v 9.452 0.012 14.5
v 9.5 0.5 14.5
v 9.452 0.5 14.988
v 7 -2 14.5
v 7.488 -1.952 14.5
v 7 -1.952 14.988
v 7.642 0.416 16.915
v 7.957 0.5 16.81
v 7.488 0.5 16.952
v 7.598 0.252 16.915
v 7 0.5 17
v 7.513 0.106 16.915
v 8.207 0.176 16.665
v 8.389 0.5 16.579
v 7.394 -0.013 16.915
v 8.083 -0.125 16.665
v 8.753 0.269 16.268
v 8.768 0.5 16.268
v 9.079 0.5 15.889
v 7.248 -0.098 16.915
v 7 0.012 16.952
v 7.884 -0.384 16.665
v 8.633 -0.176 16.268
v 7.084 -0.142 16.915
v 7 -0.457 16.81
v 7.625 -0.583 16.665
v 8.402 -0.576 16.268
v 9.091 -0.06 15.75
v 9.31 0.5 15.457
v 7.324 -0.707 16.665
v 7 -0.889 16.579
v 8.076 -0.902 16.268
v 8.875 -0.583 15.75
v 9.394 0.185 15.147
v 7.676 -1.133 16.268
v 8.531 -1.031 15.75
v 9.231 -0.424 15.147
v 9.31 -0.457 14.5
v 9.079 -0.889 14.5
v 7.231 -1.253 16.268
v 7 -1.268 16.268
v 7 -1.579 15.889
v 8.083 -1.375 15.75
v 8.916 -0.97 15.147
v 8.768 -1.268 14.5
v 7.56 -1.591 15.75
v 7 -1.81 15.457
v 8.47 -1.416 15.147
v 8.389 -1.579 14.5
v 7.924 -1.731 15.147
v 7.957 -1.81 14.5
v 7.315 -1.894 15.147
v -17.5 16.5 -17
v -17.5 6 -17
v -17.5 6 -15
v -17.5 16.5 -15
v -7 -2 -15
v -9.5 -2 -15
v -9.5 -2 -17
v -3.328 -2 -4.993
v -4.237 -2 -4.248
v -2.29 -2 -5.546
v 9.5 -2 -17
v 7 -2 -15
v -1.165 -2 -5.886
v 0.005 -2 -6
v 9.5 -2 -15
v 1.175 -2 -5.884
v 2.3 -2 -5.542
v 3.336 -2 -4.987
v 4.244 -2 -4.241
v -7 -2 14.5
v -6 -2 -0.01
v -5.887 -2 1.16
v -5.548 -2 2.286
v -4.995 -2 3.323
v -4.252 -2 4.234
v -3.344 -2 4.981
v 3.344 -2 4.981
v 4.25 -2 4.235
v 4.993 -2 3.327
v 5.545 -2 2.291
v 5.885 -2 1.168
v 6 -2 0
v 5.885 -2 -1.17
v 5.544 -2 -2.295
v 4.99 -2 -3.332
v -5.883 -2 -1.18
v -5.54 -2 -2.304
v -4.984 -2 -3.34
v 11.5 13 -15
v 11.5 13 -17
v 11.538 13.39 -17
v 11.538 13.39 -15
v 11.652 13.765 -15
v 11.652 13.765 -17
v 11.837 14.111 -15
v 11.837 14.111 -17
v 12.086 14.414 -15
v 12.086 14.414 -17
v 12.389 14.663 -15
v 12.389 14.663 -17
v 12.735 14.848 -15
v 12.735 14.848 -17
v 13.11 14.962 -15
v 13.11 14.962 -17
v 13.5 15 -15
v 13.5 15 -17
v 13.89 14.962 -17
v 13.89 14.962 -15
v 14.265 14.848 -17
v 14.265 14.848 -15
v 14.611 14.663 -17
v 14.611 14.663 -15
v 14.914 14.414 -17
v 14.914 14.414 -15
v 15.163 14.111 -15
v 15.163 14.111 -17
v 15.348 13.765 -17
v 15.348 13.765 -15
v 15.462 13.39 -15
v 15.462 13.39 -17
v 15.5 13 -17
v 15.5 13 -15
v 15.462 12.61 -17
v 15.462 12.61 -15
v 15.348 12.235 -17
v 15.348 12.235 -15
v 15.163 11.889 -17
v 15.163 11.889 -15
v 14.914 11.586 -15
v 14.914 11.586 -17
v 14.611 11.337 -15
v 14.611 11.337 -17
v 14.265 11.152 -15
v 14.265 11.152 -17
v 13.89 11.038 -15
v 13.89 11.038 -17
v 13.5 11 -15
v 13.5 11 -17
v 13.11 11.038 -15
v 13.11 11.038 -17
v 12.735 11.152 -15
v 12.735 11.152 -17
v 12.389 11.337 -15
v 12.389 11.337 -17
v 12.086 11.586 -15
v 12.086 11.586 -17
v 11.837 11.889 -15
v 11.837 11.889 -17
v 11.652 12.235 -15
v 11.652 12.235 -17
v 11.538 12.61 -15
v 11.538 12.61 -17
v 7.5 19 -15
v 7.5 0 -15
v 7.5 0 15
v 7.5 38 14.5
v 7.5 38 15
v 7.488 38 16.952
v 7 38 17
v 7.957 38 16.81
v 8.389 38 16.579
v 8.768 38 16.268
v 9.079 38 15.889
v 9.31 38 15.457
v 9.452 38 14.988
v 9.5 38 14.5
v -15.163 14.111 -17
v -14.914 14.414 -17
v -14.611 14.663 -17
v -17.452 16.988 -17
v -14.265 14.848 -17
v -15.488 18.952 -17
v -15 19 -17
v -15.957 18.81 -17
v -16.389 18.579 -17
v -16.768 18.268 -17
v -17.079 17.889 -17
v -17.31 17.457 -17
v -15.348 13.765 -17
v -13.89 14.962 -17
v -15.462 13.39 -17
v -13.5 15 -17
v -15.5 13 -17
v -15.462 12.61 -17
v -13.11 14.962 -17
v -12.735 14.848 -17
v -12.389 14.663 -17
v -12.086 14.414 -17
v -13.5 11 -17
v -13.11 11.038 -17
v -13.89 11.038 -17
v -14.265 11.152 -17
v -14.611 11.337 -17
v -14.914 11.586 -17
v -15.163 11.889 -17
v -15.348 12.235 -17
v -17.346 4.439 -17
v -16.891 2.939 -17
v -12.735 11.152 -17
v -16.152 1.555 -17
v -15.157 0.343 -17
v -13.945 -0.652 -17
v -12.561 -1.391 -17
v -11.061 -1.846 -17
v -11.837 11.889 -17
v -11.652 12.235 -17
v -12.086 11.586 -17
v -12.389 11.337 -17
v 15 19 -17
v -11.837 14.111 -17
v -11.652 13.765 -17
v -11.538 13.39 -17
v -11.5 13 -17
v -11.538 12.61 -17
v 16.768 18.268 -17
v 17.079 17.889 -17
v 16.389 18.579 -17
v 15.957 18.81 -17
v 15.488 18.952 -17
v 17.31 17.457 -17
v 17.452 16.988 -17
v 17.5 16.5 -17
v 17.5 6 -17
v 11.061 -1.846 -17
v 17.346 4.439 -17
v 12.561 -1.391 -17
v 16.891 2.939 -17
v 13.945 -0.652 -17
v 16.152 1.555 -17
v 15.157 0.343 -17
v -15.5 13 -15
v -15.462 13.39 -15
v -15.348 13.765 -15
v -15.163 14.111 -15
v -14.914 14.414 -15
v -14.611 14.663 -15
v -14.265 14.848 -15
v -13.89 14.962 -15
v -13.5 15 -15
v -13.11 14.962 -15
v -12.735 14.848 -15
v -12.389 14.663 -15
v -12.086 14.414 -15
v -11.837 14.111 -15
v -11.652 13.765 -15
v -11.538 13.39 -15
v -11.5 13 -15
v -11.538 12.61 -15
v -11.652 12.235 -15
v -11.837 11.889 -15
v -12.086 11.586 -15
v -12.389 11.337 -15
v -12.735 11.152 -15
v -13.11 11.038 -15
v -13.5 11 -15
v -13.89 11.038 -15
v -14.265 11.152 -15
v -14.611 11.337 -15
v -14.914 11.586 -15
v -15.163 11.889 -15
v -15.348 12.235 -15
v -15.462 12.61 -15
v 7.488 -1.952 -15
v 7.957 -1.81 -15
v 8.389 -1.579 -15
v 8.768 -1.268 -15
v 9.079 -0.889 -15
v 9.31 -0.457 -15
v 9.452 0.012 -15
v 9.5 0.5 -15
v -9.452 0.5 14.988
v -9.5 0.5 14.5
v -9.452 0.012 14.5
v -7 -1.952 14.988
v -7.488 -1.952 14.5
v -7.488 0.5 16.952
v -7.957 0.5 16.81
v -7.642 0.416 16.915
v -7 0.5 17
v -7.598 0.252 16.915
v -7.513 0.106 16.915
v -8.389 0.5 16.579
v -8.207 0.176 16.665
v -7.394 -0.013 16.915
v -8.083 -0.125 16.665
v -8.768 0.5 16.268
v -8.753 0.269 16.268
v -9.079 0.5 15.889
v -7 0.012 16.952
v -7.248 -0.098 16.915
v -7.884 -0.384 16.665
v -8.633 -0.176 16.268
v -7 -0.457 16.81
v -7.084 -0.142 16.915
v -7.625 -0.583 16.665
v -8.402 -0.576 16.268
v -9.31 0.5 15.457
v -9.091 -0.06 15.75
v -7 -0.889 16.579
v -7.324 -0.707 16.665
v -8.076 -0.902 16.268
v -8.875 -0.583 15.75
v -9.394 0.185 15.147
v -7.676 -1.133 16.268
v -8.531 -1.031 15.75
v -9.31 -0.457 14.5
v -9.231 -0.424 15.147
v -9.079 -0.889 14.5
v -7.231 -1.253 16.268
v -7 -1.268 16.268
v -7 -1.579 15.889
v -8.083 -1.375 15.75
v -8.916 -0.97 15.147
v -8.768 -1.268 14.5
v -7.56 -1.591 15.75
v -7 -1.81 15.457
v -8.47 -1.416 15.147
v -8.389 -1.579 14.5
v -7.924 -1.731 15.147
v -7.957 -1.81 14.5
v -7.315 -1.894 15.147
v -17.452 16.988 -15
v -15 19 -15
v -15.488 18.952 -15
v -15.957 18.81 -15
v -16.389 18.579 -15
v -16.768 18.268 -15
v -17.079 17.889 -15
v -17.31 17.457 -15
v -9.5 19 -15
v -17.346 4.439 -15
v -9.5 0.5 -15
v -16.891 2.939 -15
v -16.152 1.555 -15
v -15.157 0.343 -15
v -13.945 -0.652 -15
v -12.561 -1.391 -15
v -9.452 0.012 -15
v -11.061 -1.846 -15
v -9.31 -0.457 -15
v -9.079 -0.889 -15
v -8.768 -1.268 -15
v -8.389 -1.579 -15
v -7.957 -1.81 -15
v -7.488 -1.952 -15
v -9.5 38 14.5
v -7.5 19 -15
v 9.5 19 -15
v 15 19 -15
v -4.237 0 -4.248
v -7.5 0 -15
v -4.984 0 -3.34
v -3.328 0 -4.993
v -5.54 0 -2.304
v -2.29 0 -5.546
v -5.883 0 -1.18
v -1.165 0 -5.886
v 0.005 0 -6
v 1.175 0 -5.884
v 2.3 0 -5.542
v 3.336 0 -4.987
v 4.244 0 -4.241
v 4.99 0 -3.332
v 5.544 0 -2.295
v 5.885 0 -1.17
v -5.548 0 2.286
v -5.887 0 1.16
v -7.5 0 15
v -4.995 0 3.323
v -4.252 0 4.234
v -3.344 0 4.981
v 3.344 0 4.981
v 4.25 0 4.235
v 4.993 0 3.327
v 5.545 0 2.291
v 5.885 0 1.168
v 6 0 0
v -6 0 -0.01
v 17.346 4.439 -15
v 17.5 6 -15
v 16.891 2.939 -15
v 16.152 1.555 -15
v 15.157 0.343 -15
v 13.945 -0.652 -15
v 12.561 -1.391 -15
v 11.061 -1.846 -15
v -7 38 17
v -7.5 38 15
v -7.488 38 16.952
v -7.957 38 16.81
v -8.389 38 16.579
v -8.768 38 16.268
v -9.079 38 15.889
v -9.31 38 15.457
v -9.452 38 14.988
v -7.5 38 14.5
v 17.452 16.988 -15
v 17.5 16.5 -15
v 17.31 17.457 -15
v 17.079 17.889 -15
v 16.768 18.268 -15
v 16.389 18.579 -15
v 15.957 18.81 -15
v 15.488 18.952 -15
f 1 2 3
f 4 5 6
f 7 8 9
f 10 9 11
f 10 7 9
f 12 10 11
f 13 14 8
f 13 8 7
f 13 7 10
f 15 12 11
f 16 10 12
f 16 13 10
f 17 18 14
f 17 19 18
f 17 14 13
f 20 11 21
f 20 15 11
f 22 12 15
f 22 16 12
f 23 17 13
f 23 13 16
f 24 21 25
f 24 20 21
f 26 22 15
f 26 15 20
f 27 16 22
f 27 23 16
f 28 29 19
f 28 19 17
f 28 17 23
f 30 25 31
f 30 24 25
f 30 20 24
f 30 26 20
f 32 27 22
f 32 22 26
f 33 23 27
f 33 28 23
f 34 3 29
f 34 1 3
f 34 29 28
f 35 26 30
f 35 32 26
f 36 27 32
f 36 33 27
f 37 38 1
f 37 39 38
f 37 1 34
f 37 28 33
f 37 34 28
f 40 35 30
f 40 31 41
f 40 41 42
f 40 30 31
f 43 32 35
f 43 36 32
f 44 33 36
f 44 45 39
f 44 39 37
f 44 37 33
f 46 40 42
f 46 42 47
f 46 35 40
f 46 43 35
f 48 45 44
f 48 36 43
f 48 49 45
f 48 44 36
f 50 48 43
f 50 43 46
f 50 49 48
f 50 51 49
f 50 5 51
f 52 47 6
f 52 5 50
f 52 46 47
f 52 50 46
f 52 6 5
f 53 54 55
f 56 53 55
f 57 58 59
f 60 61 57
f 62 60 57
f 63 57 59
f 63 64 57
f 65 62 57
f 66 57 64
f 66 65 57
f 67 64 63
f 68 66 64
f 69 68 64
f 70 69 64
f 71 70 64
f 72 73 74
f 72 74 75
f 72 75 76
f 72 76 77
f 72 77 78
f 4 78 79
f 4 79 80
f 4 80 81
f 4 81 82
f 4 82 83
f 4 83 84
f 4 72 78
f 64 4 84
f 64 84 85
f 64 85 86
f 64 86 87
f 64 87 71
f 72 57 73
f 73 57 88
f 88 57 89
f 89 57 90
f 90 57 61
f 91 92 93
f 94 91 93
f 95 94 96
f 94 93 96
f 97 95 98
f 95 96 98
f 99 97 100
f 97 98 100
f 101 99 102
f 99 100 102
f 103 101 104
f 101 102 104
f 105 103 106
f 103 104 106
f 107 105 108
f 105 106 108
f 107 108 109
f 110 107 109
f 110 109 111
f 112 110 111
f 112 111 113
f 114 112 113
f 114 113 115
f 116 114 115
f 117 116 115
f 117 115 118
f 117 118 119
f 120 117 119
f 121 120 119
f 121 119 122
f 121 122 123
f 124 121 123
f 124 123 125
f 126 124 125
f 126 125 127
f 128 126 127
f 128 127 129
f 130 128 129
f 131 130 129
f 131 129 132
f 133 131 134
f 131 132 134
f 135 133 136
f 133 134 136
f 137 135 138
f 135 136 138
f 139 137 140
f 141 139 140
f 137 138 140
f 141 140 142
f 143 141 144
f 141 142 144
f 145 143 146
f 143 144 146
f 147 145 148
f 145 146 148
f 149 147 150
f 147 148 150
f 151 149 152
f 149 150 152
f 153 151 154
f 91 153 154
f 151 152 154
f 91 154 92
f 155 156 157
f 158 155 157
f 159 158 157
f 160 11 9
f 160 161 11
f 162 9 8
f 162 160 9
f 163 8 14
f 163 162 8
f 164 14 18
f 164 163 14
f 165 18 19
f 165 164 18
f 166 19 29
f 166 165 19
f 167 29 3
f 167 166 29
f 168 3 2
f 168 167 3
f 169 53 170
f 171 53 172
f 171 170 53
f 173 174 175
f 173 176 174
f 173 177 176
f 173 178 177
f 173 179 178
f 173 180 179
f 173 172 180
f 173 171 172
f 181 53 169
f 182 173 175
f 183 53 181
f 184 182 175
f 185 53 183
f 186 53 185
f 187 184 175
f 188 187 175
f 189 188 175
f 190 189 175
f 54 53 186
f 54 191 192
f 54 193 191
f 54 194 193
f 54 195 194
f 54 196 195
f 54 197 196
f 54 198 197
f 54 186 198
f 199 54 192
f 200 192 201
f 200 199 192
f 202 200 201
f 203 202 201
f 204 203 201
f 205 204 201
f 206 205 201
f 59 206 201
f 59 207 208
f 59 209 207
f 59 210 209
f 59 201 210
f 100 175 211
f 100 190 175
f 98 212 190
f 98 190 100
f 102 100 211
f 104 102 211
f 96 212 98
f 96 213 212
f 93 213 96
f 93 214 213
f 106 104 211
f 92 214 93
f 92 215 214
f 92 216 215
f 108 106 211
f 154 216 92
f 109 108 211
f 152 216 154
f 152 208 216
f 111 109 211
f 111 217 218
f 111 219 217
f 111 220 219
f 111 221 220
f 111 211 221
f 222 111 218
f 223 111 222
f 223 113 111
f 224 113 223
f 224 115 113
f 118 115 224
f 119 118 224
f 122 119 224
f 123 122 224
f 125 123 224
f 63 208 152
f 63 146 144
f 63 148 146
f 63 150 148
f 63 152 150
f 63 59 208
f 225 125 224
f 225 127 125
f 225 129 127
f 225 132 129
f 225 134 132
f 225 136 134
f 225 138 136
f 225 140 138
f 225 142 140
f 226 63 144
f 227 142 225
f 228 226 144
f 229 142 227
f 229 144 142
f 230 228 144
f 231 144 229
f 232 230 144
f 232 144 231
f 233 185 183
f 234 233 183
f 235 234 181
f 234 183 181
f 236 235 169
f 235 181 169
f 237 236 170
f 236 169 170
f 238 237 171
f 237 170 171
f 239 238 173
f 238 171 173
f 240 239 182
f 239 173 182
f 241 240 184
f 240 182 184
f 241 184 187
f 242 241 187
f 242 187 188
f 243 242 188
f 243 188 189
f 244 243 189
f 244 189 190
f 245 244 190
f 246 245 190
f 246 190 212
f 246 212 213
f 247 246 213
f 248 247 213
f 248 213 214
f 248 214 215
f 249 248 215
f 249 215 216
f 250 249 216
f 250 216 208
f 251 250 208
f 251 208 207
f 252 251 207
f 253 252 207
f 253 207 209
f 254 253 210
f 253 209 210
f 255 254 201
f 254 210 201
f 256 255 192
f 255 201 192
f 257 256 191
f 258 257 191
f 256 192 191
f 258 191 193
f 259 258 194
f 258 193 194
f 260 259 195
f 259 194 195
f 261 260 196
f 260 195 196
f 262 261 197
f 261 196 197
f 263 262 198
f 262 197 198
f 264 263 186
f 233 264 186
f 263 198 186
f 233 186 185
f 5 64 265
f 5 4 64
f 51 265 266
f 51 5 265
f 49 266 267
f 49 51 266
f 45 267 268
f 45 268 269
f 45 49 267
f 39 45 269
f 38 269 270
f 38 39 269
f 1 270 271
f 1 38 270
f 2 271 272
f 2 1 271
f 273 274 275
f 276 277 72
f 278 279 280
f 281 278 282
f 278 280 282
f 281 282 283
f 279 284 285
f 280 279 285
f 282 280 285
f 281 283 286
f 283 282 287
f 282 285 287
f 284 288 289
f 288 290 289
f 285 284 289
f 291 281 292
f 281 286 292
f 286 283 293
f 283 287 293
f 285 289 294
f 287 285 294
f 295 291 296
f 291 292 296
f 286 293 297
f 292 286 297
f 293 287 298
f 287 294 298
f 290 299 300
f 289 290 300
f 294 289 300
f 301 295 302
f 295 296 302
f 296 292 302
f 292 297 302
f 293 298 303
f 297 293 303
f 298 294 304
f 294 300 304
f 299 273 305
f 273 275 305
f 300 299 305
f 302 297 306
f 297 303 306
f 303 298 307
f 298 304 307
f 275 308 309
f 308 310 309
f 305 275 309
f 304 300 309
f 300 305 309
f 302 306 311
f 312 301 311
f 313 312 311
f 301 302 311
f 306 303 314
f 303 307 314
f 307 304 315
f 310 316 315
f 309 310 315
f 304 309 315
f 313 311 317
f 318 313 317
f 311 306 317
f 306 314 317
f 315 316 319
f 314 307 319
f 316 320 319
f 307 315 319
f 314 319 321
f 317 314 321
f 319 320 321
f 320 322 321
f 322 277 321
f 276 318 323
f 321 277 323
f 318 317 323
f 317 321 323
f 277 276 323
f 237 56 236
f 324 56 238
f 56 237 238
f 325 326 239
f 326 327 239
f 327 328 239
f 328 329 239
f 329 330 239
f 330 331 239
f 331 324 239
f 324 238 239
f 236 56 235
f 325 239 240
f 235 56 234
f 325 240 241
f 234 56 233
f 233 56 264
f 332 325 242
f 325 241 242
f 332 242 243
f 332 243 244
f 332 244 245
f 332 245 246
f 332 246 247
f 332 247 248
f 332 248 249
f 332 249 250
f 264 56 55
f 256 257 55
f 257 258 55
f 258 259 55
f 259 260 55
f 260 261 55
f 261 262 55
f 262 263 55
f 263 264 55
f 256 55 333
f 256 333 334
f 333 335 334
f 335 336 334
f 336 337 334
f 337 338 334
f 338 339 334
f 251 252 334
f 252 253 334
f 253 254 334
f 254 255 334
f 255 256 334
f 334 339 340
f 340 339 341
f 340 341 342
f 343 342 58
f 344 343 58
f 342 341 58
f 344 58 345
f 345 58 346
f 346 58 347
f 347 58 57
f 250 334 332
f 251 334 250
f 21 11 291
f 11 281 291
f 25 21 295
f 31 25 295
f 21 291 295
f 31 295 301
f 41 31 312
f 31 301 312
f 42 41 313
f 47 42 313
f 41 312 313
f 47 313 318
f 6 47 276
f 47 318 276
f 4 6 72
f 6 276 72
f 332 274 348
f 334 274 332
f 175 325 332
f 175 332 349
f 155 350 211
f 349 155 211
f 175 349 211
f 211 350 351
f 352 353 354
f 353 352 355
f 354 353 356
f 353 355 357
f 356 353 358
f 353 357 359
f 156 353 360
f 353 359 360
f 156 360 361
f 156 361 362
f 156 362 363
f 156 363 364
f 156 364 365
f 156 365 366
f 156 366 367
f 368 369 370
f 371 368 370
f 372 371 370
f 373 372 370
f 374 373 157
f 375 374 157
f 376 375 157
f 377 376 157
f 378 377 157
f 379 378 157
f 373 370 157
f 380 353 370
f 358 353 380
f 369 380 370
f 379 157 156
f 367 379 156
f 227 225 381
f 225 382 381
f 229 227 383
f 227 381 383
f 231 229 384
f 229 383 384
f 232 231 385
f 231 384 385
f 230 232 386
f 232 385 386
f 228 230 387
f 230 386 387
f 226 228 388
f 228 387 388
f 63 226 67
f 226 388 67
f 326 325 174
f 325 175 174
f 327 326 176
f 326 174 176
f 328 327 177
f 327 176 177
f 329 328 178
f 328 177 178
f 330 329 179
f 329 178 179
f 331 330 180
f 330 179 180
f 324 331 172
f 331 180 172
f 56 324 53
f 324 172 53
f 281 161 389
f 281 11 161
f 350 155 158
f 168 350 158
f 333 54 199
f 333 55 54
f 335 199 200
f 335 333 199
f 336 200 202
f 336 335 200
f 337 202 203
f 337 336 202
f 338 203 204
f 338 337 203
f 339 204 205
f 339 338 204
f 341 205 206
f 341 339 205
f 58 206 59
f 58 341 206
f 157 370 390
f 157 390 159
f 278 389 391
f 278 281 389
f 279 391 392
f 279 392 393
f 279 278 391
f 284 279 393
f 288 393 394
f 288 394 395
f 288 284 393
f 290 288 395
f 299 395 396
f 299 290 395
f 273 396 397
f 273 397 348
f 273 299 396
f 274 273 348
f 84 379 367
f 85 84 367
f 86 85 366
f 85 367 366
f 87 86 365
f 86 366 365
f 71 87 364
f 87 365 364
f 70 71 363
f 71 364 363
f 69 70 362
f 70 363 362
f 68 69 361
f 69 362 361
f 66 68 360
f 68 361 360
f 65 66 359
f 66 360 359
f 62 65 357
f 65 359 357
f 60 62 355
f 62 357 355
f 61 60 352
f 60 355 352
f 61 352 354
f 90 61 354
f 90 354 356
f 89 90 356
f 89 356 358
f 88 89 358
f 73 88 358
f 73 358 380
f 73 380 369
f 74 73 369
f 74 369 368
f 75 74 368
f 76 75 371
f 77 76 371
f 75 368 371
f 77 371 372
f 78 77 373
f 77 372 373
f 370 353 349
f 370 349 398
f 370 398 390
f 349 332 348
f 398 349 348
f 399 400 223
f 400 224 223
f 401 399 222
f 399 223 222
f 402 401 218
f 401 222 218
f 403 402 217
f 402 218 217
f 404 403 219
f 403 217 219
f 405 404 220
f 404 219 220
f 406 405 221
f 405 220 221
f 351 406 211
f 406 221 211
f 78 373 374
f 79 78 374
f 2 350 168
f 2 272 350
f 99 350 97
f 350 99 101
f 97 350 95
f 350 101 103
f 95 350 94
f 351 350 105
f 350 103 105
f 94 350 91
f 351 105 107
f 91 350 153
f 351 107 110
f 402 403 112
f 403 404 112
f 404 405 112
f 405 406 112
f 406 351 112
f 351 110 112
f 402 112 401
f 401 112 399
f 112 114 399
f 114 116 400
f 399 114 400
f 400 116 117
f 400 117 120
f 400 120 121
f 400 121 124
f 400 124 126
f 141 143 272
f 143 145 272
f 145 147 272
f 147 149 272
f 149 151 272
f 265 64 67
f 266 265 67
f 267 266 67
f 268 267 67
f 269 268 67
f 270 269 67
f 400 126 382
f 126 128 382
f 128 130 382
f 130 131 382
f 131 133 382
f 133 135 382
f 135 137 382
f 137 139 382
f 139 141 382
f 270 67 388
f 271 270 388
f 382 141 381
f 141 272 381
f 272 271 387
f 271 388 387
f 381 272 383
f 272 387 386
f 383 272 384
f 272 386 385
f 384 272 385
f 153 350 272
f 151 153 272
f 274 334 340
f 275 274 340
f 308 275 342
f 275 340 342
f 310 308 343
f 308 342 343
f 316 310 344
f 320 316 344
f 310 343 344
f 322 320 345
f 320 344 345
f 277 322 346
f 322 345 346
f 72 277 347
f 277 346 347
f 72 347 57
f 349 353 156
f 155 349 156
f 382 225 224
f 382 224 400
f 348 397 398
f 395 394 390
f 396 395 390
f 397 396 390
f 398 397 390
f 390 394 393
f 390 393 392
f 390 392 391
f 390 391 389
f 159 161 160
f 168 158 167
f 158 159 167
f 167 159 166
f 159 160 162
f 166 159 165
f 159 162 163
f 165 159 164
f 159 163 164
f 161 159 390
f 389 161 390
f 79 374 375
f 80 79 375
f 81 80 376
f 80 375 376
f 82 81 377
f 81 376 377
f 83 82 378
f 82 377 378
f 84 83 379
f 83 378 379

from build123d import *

# Parameters (mm, degrees)
F0_W      = 15
F0_H      = 30
F0_W_2    = 8
F0_H_2    = 2
F1_DEPTH  = 2
F2_DEPTH  = 38
F4_W      = 8
F4_H      = 19
F5_DEPTH  = 25
F6_D      = 4
F6_DEPTH  = 50
F6_TIP    = 1.2017212381
F7_R      = 2.5
F8_R      = 8
F10_DEPTH = 25


with BuildPart() as f1:
    # F0 (on Front) → F1 (new body)
    with BuildSketch(Plane.XZ):
        Polygon((9.5, -15), (9.5, 17), (-9.5, 17), (-9.5, -15), (-9.5, -17), (9.5, -17), align=None)
        Rectangle(F0_W, F0_H, mode=Mode.SUBTRACT)
        with Locations((13.5, -16)):
            Rectangle(F0_W_2, F0_H_2)
        with Locations((-13.5, -16)):
            Rectangle(F0_W_2, F0_H_2)
        Rectangle(F0_W, F0_H)
        with BuildLine():
            ThreePointArc((3.3443871458, 4.9814731375), (5.2946351562, 2.8225588679), (6, 0))
            ThreePointArc((6, 0), (-2.8225588679, -5.2946351562), (-3.3443871458, 4.9814731375))
            ThreePointArc((-3.3443871458, 4.9814731375), (0, 6), (3.3443871458, 4.9814731375))
        make_face(mode=Mode.SUBTRACT)
        with BuildLine():
            Line((-3.3443871458, 4.9814731375), (3.3443871458, 4.9814731375))
            ThreePointArc((3.3443871458, 4.9814731375), (0, 6), (-3.3443871458, 4.9814731375))
        make_face()
    extrude(amount=F1_DEPTH)

    # F0 (on Front) → F2 (join)
    with BuildSketch(Plane.XZ):
        Polygon((9.5, -15), (9.5, 17), (-9.5, 17), (-9.5, -15), (-9.5, -17), (9.5, -17), align=None)
        Rectangle(F0_W, F0_H, mode=Mode.SUBTRACT)
        with Locations((13.5, -16)):
            Rectangle(F0_W_2, F0_H_2)
        with Locations((-13.5, -16)):
            Rectangle(F0_W_2, F0_H_2)
    extrude(amount=-F2_DEPTH)

    # F4 (on offset) → F5 (cut)
    with BuildSketch(Plane.XY.offset(-15)):
        with Locations((-13.5, 28.5)):
            Rectangle(F4_W, F4_H)
        with Locations((13.5, 28.5)):
            Rectangle(F4_W, F4_H)
    extrude(amount=-F5_DEPTH, mode=Mode.SUBTRACT)

    # F6
    with Locations(Plane.XY.offset(-15)):
        with Locations((-13.5, 13), (13.5, 13)):
            Hole(F6_D / 2, depth=F6_DEPTH)
            with Locations((0, 0, -(F6_DEPTH + F6_TIP / 2))):  # 118° drill point
                Cone(0, F6_D / 2, F6_TIP, mode=Mode.SUBTRACT)

    # F7
    f7_edges = [f1.edges().sort_by_distance(p)[0] for p in [
        (9.5, -2, 1),
        (-9.5, -2, 1),
        (-9.5, 18, 17),
        (9.5, 18, 17),
        (0, -2, 17),
        (17.5, 19, -16),
        (-17.5, 19, -16),
    ]]
    fillet(f7_edges, radius=F7_R)

    # F8
    f8_edges = [f1.edges().sort_by_distance(p)[0] for p in [
        (-17.5, -2, -16),
        (17.5, -2, -16),
    ]]
    fillet(f8_edges, radius=F8_R)

    # F9 (on face) → F10 (cut)
    with BuildSketch(Plane(origin=(-9.5, 0, 0), x_dir=(0, -1, 0), z_dir=(-1, 0, 0))):
        Polygon((-19, -15), (-38, 14.5), (-38, -17), (-19, -17), align=None)
    extrude(amount=-F10_DEPTH, mode=Mode.SUBTRACT)


solid = f1.part
